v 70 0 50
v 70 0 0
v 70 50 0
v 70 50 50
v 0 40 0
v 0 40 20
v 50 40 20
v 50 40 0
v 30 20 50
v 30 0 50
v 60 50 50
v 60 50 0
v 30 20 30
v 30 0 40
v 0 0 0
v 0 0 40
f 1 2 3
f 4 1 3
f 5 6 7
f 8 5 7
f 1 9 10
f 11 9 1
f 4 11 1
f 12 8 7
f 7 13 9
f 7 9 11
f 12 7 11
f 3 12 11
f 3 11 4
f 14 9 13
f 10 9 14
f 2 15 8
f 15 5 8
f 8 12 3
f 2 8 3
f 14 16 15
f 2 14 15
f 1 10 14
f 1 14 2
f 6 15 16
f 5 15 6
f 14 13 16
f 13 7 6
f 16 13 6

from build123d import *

# Parameters (mm, degrees)
SKETCH1_W           = 70
SKETCH1_H           = 50
BOSS_EXTRUDE1_DEPTH = 50
CUT_EXTRUDE1_DEPTH  = 50
CUT_EXTRUDE2_DEPTH  = 30
BOSS_EXTRUDE2_DEPTH = 30
SKETCH8_W           = 70
SKETCH8_H           = 40
CUT_EXTRUDE7_DEPTH  = 30
SKETCH9_W           = 70
SKETCH9_H           = 50
CUT_EXTRUDE8_DEPTH  = 30


with BuildPart() as part:
    # Sketch1 → Boss-Extrude1 (new body)
    with BuildSketch(Plane.XY):
        with Locations((35, 25)):
            Rectangle(SKETCH1_W, SKETCH1_H)
    extrude(amount=BOSS_EXTRUDE1_DEPTH)

    # Sketch2 → Cut-Extrude1 (cut)
    with BuildSketch(Plane.XY.offset(50)):
        Polygon((0, 40), (50, 40), (60, 50), (0, 50), align=None)
    extrude(amount=-CUT_EXTRUDE1_DEPTH, mode=Mode.SUBTRACT)

    # Sketch3 → Cut-Extrude2 (cut)
    with BuildSketch(Plane.XY.offset(50)):
        Polygon((50, 40), (30, 20), (30, 0), (0, 0), (0, 40), align=None)
    extrude(amount=-CUT_EXTRUDE2_DEPTH, mode=Mode.SUBTRACT)

    # Sketch7 → Boss-Extrude2 (add)
    with BuildSketch(Plane(origin=(0, 16, 32), x_dir=(-1, 0, 0), z_dir=(0, -0.447213595, -0.894427191))):
        Polygon((0, 26.83281573), (-50, 26.83281573), (-30, -17.88854382), (0, -17.88854382), align=None)
    extrude(amount=BOSS_EXTRUDE2_DEPTH)

    # Sketch8 → Cut-Extrude7 (cut)
    with BuildSketch(Plane(origin=(0, 0, 0), x_dir=(-1, 0, 0), z_dir=(0, 0, -1))):
        with Locations((-35, 20)):
            Rectangle(SKETCH8_W, SKETCH8_H)
    extrude(amount=CUT_EXTRUDE7_DEPTH, mode=Mode.SUBTRACT)

    # Sketch9 → Cut-Extrude8 (cut)
    with BuildSketch(Plane.XZ):
        with Locations((35, 25)):
            Rectangle(SKETCH9_W, SKETCH9_H)
    extrude(amount=CUT_EXTRUDE8_DEPTH, mode=Mode.SUBTRACT)


solid = part.part
